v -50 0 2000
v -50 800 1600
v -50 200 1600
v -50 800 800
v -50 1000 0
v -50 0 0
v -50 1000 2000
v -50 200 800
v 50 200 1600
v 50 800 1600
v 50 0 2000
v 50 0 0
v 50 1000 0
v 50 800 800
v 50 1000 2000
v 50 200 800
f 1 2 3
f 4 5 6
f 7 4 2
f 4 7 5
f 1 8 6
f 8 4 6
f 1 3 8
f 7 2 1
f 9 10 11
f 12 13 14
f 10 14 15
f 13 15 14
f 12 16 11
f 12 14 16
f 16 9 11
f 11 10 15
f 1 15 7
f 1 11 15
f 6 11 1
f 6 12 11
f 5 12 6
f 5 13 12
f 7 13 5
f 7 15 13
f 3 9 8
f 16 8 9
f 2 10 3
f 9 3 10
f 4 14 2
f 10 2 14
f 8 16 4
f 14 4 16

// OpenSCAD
// file: ../../../libs/basic-dims.scad
unit = 1000;

section_width = unit;
section_height = unit * 2;
section_thickness = unit * 0.1;

rt = sqrt(2);

//  -- Notes --
//  Z is UP
//  X is FORWARD (out of the screen)
// file: ../../../libs/modifiers/diagonalize.scad
include <../basic-dims.scad>

module diagonalize_triangle_sketch(t = section_thickness) {
    x = sin(45) * t;
    y = cos(45) * t;

    polygon([
        [0, y],
        [x, 0],
        [0, -y]
    ]);
}

module diagonalize_triangle(t = section_thickness) {
    rotate([0, 0, 90])
    linear_extrude(section_height)
    diagonalize_triangle_sketch(t);
}

module diagonalize2D() {
    thickness = section_thickness / rt;

    trans = (section_thickness/2)*rt/2;
    len_scale = rt - section_thickness / (rt * section_width);

    rotate([0, 0, 45])
    translate([trans, 0, 0])
    scale([len_scale, 1/rt, 1])
    children();
}


module diagonalize3D(w = section_width, t = section_thickness, edges = "trans") {

    trans = (t/2)*rt/2;
    len_scale = rt - t / (rt * w);

    edge_angle = edges == "cis" ? 270 : 180;
    
    diagonalize_triangle(t/rt);

    translate([-w, w, 0])
    rotate([0, 0, edge_angle]) // 180 For continue, -90 (270) for end
    diagonalize_triangle(t/rt);

    rotate([0, 0, 45])
    translate([0, trans, 0])
    scale([1/rt, len_scale, 1])
    children();
}
// file: ../../../libs/templates/t_window.scad
include <../basic-dims.scad>

simple_window_width = 0.6 * section_width;
simple_window_height = 0.4 * section_height;
simple_window_bottom_offset = 0.4 * section_height;

module simple_window_sketch() {
    difference() {
        square([section_width, section_height]);

        translate([
            section_width/2 - simple_window_width/2,
            simple_window_bottom_offset,
            0])
        square([simple_window_width, simple_window_height]);
    }
}

module window() {
    rotate([90, 0, 90])
    translate([0, 0, -section_thickness/2])
    linear_extrude(section_thickness)
    simple_window_sketch();
}
// main file
include <../../../libs/templates/t_window.scad>
include <../../../libs/modifiers/diagonalize.scad>

window();
